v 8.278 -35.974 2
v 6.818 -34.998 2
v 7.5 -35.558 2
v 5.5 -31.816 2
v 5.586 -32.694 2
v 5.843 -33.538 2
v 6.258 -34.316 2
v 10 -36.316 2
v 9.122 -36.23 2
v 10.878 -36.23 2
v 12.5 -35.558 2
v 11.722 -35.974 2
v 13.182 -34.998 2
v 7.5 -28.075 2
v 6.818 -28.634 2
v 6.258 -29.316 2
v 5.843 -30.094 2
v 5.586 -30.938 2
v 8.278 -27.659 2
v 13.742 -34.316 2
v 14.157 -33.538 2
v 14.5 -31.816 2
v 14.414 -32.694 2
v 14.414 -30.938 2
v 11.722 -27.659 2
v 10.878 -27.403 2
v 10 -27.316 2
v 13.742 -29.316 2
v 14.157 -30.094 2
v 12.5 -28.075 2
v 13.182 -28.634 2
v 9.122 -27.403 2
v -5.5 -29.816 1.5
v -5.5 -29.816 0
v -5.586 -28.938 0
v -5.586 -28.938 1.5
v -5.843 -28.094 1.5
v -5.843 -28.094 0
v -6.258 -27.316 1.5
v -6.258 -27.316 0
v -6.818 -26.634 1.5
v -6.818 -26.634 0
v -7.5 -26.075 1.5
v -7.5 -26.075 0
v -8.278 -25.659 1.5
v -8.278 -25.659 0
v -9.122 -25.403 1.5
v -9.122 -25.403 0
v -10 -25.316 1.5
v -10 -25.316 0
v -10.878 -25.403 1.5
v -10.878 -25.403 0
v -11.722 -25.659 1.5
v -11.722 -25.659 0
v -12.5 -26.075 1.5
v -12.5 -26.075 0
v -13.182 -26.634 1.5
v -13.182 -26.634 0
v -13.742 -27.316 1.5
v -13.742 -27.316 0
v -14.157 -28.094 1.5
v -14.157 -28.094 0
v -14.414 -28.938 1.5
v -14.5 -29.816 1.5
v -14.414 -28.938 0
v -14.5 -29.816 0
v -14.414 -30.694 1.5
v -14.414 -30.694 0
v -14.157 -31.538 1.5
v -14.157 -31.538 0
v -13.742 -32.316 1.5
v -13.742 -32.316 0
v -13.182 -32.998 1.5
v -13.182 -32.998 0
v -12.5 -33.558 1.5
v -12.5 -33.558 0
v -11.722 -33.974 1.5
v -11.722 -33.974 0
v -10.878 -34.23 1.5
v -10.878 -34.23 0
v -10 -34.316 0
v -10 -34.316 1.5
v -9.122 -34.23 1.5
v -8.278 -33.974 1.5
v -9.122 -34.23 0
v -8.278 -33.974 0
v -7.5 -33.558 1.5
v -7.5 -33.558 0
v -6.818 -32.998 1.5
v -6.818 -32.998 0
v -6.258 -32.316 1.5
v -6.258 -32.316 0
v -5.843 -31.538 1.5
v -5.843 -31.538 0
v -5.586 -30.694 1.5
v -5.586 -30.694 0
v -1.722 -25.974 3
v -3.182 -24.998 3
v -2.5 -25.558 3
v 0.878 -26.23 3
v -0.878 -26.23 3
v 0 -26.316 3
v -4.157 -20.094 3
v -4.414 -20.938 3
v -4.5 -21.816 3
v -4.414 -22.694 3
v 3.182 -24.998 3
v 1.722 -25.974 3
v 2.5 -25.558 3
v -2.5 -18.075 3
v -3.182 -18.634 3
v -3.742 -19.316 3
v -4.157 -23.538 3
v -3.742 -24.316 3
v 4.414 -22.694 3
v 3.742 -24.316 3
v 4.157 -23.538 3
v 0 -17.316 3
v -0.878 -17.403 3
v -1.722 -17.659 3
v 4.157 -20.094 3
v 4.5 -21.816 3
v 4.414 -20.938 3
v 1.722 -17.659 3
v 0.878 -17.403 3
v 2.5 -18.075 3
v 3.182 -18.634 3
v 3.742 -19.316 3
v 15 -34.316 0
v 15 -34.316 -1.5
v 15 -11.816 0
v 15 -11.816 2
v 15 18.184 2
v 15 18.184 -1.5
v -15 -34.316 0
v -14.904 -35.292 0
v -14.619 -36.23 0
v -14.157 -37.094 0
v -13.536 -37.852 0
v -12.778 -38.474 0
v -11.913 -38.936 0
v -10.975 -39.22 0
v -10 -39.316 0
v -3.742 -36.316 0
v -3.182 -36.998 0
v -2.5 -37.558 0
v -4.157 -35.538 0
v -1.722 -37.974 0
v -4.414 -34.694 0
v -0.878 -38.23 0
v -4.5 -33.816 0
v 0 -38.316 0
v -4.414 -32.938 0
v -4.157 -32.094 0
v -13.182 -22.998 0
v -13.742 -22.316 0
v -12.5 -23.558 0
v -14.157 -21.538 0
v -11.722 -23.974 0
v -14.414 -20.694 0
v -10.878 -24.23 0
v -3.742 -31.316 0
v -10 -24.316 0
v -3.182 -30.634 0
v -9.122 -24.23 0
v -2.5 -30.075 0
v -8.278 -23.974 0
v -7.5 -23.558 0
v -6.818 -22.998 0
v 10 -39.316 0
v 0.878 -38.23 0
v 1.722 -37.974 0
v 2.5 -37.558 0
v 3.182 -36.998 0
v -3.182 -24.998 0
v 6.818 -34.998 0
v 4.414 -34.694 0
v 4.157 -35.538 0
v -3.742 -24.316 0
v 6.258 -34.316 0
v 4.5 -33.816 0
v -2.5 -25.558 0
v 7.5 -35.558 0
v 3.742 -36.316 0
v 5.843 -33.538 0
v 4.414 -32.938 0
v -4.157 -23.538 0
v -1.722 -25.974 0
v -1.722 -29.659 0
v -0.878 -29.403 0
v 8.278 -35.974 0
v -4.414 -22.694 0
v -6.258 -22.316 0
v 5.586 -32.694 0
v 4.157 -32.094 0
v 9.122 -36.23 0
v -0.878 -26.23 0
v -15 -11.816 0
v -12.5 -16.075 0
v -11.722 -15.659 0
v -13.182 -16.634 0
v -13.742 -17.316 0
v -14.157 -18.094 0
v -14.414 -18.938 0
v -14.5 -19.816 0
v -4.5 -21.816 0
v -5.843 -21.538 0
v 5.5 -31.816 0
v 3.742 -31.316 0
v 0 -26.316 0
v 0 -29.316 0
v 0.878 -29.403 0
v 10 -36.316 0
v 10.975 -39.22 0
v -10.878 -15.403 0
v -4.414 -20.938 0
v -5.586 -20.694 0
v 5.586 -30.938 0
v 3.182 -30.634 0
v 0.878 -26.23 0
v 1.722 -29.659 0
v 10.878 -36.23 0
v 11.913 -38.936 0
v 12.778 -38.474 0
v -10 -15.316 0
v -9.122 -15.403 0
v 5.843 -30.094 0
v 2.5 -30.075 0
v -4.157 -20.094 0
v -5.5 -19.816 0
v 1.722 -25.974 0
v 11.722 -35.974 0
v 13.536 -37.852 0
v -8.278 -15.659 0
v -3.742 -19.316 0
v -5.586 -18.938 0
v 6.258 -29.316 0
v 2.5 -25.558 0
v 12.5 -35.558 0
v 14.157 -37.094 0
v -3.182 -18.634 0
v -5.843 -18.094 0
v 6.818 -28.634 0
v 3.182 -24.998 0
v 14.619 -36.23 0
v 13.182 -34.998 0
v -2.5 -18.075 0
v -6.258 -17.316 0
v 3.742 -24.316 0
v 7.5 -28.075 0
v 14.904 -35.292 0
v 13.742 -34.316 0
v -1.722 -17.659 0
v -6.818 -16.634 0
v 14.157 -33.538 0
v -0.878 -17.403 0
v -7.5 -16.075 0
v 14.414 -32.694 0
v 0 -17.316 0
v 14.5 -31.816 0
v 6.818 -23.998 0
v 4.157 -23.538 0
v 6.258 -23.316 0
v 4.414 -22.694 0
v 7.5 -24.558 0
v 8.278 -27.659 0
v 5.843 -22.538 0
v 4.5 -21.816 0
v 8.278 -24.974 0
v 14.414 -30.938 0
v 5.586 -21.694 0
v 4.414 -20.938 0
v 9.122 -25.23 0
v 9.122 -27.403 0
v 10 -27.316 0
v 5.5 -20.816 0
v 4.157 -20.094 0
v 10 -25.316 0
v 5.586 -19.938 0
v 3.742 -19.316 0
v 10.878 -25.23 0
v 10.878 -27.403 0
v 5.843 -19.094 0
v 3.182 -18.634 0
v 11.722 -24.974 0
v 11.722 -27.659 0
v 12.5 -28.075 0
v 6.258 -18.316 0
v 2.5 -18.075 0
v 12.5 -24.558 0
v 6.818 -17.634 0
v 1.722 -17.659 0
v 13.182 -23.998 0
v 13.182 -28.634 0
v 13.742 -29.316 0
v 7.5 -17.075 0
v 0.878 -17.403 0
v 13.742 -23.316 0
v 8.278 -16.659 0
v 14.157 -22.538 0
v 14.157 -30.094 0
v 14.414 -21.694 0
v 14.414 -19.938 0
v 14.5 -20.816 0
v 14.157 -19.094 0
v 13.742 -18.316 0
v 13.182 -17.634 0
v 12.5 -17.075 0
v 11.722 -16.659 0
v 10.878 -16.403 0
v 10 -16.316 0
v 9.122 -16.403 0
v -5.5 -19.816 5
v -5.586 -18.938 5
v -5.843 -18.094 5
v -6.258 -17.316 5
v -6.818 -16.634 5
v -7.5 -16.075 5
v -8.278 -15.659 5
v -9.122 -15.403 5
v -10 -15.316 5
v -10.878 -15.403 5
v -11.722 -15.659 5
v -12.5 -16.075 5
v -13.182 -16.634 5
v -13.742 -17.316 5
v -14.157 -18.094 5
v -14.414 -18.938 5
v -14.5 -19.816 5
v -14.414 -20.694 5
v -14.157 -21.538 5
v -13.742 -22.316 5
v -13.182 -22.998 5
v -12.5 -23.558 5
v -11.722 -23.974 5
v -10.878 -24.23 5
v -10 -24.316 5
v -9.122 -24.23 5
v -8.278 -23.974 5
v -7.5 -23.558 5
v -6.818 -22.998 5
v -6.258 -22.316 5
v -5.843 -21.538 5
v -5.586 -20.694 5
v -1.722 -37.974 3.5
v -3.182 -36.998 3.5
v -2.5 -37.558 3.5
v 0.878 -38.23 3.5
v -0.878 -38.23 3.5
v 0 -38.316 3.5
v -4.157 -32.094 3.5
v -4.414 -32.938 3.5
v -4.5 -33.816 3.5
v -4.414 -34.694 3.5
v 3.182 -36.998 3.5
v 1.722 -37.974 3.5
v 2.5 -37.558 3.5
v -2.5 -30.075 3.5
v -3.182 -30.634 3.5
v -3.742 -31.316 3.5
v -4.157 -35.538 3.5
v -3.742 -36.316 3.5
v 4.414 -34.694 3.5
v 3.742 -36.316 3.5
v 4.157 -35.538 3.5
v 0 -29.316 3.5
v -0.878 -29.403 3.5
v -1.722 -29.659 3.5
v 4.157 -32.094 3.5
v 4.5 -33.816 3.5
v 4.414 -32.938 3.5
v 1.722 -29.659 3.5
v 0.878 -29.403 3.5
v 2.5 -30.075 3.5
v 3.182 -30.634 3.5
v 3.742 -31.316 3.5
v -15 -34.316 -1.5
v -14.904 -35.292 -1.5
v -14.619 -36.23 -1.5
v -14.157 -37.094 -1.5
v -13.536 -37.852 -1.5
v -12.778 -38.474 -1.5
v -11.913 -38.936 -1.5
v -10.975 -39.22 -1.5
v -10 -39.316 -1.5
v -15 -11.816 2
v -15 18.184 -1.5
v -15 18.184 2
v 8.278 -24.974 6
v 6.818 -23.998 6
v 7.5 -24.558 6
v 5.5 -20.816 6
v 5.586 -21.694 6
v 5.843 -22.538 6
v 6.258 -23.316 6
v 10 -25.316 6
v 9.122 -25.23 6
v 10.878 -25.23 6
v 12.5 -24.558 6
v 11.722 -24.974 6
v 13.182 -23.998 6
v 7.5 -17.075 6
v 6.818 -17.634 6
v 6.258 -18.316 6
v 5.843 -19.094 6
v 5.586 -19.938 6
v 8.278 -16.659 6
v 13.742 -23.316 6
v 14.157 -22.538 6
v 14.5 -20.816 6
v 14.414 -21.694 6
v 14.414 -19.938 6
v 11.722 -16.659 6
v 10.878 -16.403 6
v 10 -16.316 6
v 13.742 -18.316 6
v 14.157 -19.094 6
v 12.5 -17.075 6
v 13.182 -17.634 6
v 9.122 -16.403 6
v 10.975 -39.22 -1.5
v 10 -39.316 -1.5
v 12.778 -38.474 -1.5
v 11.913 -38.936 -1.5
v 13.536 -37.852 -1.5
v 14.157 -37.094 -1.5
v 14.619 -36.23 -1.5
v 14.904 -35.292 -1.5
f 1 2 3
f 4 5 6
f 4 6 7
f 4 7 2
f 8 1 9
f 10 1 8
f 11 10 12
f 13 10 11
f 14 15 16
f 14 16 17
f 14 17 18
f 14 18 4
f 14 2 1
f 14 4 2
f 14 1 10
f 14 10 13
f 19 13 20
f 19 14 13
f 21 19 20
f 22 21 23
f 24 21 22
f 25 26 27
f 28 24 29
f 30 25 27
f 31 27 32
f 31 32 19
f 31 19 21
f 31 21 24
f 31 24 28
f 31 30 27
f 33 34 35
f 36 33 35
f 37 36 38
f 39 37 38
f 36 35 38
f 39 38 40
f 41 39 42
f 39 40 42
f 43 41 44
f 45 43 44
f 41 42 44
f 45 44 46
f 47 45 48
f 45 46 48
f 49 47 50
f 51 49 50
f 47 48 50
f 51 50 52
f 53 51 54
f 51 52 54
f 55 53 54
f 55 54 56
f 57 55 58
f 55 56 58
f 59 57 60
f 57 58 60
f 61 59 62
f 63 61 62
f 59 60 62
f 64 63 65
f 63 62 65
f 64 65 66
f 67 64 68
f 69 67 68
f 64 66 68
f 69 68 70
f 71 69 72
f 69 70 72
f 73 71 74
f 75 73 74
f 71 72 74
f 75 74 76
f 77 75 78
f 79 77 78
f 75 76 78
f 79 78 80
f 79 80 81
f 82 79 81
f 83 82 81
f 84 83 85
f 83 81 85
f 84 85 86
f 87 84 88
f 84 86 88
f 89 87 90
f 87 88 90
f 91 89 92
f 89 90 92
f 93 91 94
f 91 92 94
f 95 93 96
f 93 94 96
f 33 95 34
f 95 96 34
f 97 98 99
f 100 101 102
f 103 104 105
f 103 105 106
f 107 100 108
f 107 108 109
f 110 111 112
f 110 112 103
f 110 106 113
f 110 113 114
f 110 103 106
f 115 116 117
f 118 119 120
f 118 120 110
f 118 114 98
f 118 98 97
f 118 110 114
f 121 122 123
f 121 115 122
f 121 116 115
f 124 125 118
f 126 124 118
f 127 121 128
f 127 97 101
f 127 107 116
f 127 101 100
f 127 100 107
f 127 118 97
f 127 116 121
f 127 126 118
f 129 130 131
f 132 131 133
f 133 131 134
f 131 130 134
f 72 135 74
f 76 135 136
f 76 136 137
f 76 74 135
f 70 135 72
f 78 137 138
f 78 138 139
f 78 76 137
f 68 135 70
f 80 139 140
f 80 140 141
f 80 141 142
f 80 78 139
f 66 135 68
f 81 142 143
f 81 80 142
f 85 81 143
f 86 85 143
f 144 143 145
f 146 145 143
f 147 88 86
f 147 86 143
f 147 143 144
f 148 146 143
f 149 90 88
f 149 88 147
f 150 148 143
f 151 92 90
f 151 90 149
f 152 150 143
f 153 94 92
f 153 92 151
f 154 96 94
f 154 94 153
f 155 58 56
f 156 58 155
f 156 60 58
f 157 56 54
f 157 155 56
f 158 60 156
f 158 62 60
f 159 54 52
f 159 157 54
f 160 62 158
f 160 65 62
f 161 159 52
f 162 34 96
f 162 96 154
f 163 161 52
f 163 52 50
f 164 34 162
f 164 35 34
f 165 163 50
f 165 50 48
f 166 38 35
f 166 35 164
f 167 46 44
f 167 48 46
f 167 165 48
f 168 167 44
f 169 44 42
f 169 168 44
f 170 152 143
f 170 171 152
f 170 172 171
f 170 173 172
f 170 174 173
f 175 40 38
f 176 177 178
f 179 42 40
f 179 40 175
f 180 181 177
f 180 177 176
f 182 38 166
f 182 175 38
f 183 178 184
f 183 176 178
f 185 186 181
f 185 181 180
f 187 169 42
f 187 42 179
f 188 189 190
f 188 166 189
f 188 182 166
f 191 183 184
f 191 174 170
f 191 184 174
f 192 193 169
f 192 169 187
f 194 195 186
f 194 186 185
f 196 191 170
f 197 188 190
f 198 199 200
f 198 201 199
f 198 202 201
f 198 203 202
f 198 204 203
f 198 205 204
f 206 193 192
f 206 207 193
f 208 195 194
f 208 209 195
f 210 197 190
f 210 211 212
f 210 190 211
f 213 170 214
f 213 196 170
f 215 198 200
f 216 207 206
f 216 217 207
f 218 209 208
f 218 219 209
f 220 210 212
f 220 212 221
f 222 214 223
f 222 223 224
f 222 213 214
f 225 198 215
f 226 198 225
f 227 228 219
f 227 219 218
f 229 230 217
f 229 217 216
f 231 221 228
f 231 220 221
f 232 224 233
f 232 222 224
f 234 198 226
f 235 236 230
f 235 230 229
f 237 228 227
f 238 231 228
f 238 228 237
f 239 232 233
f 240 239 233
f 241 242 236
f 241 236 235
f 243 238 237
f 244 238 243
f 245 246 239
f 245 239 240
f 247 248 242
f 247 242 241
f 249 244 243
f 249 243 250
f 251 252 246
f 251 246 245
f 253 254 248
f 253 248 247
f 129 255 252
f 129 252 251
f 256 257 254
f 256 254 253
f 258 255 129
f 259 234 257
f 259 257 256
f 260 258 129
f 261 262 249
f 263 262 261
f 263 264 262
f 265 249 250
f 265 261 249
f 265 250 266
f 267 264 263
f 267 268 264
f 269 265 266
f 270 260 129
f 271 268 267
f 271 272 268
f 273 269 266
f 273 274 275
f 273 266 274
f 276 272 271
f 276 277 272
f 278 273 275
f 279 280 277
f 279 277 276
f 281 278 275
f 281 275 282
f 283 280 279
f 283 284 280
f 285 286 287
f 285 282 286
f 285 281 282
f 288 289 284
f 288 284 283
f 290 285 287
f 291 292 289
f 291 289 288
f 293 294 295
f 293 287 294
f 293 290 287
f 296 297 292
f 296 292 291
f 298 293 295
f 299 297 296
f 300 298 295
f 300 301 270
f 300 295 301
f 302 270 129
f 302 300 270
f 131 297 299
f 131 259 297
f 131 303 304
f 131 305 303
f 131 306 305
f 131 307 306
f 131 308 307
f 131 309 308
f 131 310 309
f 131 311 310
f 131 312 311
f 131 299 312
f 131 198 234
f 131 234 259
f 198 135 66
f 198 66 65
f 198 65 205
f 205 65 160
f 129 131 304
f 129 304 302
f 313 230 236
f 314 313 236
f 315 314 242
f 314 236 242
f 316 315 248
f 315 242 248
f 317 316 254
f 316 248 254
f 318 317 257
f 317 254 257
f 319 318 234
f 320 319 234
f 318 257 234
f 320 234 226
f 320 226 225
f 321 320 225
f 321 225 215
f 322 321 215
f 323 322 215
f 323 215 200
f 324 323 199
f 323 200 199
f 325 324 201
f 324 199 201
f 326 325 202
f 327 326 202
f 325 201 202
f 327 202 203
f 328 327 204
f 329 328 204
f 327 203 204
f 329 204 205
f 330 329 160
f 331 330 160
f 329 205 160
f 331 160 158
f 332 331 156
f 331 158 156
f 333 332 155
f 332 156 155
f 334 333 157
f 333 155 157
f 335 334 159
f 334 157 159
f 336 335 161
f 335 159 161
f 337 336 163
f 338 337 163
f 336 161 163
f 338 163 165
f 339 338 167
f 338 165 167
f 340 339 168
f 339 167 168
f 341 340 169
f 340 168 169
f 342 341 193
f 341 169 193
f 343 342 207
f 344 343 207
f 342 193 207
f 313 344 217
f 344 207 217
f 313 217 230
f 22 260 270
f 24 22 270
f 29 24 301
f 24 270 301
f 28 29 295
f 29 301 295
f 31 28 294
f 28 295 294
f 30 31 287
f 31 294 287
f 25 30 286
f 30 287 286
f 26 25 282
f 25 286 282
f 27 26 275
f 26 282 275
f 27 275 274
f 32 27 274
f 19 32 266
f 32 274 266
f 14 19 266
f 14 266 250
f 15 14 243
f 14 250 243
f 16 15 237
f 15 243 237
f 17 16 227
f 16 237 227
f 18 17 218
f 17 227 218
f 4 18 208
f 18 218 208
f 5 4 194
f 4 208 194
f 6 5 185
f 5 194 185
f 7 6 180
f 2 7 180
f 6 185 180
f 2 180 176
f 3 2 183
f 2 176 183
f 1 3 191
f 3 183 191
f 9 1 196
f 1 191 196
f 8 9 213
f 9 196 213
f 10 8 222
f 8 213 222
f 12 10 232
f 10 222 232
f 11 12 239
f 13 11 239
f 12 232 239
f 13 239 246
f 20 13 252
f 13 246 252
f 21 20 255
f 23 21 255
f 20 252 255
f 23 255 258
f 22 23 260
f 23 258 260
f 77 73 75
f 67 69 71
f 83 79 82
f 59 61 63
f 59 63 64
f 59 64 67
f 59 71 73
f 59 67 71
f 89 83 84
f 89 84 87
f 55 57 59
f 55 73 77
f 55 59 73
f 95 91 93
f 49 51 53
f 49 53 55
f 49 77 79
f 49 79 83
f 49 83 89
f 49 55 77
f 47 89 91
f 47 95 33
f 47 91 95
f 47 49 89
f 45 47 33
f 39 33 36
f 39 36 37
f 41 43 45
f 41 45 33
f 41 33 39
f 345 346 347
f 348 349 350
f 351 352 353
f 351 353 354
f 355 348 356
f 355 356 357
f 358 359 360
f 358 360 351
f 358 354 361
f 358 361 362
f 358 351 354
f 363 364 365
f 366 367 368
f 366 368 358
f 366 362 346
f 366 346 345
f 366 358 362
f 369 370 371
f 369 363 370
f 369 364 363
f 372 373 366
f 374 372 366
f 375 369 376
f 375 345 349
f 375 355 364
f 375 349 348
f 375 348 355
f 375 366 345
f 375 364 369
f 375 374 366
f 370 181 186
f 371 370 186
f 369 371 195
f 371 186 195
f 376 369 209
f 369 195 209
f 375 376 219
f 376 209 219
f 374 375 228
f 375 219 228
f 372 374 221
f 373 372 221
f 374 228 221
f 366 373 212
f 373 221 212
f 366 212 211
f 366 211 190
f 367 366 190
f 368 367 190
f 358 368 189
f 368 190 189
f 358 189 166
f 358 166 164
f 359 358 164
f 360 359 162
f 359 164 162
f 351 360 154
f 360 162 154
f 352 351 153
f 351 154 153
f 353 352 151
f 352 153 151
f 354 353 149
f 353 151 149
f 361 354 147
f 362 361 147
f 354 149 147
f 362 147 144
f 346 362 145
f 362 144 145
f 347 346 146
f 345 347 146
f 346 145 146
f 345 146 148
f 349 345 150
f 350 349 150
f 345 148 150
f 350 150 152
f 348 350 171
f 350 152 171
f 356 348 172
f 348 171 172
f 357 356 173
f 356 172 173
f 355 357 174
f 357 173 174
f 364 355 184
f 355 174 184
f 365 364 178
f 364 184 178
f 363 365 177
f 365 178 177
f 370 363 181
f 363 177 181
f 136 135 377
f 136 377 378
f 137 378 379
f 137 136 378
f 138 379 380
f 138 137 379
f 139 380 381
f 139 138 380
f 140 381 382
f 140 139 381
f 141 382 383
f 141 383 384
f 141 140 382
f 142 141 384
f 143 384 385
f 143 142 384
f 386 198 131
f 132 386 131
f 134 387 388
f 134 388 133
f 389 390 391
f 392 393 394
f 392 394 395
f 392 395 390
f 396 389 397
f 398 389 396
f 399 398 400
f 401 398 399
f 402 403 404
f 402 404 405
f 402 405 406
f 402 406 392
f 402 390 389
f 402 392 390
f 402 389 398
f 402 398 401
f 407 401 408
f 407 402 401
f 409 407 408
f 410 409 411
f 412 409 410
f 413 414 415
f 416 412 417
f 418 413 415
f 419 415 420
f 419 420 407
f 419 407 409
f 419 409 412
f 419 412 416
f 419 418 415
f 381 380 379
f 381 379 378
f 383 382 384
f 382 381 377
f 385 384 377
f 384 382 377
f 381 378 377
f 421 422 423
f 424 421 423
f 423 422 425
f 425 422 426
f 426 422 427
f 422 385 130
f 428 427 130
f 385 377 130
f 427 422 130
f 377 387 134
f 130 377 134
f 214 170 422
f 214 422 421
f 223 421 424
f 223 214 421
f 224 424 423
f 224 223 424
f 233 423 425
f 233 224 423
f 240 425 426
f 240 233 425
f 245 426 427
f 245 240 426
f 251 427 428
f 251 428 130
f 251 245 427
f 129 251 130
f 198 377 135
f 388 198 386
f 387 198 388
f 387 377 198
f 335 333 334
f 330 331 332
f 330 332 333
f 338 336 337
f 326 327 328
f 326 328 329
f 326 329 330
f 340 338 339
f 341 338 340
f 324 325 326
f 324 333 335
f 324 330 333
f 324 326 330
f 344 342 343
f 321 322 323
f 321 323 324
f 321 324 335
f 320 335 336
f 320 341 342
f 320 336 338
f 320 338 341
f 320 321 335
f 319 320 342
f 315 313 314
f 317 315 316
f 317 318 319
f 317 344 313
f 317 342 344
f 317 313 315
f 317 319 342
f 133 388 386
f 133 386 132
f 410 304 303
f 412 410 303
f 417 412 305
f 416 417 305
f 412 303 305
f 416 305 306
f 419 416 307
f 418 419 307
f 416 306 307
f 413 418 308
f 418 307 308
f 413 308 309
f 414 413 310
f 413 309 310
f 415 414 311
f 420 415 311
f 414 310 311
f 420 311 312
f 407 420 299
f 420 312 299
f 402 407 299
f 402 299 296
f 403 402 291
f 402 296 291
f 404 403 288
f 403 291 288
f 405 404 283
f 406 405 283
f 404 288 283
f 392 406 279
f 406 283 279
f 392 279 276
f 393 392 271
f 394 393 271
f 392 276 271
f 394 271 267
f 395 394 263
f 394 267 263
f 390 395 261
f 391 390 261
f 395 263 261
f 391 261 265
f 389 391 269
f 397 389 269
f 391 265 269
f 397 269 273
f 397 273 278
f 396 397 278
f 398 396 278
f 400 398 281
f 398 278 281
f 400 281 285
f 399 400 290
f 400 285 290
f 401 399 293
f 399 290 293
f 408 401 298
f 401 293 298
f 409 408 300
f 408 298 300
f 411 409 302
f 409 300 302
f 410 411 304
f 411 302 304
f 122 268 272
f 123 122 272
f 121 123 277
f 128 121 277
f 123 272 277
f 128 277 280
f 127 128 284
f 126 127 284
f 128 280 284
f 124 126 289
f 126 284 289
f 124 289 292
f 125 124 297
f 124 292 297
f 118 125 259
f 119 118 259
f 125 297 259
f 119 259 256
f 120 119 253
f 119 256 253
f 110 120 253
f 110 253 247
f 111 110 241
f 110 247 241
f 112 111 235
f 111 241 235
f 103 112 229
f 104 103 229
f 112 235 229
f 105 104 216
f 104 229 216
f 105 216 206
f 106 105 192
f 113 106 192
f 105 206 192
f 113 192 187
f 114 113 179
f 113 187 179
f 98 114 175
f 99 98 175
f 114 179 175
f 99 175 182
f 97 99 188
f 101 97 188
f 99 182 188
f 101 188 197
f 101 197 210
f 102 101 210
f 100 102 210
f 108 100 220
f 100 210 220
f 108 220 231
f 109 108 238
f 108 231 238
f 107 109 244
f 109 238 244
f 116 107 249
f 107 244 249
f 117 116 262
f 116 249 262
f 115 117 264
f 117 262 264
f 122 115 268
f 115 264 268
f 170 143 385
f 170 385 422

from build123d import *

# Parameters (mm, degrees)
F0_W     = 30
F0_H     = 30
F0_R     = 4.5
F1_DEPTH = 1.5
F2_DEPTH = 2
F3_DEPTH = 5
F4_DEPTH = 3
F5_DEPTH = 6
F6_DEPTH = 2
F7_DEPTH = 3.5
F8_DEPTH = 1.5


with BuildPart() as f1:
    # F0 (on Top) → F1 (new body)
    with BuildSketch(Plane.XY):
        with Locations((0, 3.183698)):
            Rectangle(F0_W, F0_H)
        with BuildLine():
            Line((15, -11.816302), (-15, -11.816302))
            Line((-15, -11.816302), (-15, -34.316302))
            ThreePointArc((-15, -34.316302), (-13.535534, -37.851836), (-10, -39.316302))
            Line((-10, -39.316302), (10, -39.316302))
            ThreePointArc((10, -39.316302), (13.535534, -37.851836), (15, -34.316302))
            Line((15, -34.316302), (15, -11.816302))
        make_face()
        with Locations((-10, -29.816302)):
            Circle(F0_R, mode=Mode.SUBTRACT)
        with Locations((-10, -19.816302)):
            Circle(F0_R, mode=Mode.SUBTRACT)
        with Locations((0, -33.816302)):
            Circle(F0_R, mode=Mode.SUBTRACT)
        with Locations((10, -31.816302)):
            Circle(F0_R, mode=Mode.SUBTRACT)
        with Locations((0, -21.816302)):
            Circle(F0_R, mode=Mode.SUBTRACT)
        with Locations((10, -20.816302)):
            Circle(F0_R, mode=Mode.SUBTRACT)
        with Locations((-10, -19.816302)):
            Circle(F0_R)
        with Locations((0, -21.816302)):
            Circle(F0_R)
        with Locations((10, -20.816302)):
            Circle(F0_R)
        with Locations((10, -31.816302)):
            Circle(F0_R)
        with Locations((0, -33.816302)):
            Circle(F0_R)
        with Locations((-10, -29.816302)):
            Circle(F0_R)
    extrude(amount=-F1_DEPTH)

    # F0 (on Top) → F2 (join)
    with BuildSketch(Plane.XY):
        with Locations((0, 3.183698)):
            Rectangle(F0_W, F0_H)
    extrude(amount=F2_DEPTH)

    # F0 (on Top) → F3 (join)
    with BuildSketch(Plane.XY):
        with Locations((-10, -19.816302)):
            Circle(F0_R)
    extrude(amount=F3_DEPTH)

    # F0 (on Top) → F4 (join)
    with BuildSketch(Plane.XY):
        with Locations((0, -21.816302)):
            Circle(F0_R)
    extrude(amount=F4_DEPTH)

    # F0 (on Top) → F5 (join)
    with BuildSketch(Plane.XY):
        with Locations((10, -20.816302)):
            Circle(F0_R)
    extrude(amount=F5_DEPTH)

    # F0 (on Top) → F6 (join)
    with BuildSketch(Plane.XY):
        with Locations((10, -31.816302)):
            Circle(F0_R)
    extrude(amount=F6_DEPTH)

    # F0 (on Top) → F7 (join)
    with BuildSketch(Plane.XY):
        with Locations((0, -33.816302)):
            Circle(F0_R)
    extrude(amount=F7_DEPTH)

    # F0 (on Top) → F8 (join)
    with BuildSketch(Plane.XY):
        with Locations((-10, -29.816302)):
            Circle(F0_R)
    extrude(amount=F8_DEPTH)


solid = f1.part
